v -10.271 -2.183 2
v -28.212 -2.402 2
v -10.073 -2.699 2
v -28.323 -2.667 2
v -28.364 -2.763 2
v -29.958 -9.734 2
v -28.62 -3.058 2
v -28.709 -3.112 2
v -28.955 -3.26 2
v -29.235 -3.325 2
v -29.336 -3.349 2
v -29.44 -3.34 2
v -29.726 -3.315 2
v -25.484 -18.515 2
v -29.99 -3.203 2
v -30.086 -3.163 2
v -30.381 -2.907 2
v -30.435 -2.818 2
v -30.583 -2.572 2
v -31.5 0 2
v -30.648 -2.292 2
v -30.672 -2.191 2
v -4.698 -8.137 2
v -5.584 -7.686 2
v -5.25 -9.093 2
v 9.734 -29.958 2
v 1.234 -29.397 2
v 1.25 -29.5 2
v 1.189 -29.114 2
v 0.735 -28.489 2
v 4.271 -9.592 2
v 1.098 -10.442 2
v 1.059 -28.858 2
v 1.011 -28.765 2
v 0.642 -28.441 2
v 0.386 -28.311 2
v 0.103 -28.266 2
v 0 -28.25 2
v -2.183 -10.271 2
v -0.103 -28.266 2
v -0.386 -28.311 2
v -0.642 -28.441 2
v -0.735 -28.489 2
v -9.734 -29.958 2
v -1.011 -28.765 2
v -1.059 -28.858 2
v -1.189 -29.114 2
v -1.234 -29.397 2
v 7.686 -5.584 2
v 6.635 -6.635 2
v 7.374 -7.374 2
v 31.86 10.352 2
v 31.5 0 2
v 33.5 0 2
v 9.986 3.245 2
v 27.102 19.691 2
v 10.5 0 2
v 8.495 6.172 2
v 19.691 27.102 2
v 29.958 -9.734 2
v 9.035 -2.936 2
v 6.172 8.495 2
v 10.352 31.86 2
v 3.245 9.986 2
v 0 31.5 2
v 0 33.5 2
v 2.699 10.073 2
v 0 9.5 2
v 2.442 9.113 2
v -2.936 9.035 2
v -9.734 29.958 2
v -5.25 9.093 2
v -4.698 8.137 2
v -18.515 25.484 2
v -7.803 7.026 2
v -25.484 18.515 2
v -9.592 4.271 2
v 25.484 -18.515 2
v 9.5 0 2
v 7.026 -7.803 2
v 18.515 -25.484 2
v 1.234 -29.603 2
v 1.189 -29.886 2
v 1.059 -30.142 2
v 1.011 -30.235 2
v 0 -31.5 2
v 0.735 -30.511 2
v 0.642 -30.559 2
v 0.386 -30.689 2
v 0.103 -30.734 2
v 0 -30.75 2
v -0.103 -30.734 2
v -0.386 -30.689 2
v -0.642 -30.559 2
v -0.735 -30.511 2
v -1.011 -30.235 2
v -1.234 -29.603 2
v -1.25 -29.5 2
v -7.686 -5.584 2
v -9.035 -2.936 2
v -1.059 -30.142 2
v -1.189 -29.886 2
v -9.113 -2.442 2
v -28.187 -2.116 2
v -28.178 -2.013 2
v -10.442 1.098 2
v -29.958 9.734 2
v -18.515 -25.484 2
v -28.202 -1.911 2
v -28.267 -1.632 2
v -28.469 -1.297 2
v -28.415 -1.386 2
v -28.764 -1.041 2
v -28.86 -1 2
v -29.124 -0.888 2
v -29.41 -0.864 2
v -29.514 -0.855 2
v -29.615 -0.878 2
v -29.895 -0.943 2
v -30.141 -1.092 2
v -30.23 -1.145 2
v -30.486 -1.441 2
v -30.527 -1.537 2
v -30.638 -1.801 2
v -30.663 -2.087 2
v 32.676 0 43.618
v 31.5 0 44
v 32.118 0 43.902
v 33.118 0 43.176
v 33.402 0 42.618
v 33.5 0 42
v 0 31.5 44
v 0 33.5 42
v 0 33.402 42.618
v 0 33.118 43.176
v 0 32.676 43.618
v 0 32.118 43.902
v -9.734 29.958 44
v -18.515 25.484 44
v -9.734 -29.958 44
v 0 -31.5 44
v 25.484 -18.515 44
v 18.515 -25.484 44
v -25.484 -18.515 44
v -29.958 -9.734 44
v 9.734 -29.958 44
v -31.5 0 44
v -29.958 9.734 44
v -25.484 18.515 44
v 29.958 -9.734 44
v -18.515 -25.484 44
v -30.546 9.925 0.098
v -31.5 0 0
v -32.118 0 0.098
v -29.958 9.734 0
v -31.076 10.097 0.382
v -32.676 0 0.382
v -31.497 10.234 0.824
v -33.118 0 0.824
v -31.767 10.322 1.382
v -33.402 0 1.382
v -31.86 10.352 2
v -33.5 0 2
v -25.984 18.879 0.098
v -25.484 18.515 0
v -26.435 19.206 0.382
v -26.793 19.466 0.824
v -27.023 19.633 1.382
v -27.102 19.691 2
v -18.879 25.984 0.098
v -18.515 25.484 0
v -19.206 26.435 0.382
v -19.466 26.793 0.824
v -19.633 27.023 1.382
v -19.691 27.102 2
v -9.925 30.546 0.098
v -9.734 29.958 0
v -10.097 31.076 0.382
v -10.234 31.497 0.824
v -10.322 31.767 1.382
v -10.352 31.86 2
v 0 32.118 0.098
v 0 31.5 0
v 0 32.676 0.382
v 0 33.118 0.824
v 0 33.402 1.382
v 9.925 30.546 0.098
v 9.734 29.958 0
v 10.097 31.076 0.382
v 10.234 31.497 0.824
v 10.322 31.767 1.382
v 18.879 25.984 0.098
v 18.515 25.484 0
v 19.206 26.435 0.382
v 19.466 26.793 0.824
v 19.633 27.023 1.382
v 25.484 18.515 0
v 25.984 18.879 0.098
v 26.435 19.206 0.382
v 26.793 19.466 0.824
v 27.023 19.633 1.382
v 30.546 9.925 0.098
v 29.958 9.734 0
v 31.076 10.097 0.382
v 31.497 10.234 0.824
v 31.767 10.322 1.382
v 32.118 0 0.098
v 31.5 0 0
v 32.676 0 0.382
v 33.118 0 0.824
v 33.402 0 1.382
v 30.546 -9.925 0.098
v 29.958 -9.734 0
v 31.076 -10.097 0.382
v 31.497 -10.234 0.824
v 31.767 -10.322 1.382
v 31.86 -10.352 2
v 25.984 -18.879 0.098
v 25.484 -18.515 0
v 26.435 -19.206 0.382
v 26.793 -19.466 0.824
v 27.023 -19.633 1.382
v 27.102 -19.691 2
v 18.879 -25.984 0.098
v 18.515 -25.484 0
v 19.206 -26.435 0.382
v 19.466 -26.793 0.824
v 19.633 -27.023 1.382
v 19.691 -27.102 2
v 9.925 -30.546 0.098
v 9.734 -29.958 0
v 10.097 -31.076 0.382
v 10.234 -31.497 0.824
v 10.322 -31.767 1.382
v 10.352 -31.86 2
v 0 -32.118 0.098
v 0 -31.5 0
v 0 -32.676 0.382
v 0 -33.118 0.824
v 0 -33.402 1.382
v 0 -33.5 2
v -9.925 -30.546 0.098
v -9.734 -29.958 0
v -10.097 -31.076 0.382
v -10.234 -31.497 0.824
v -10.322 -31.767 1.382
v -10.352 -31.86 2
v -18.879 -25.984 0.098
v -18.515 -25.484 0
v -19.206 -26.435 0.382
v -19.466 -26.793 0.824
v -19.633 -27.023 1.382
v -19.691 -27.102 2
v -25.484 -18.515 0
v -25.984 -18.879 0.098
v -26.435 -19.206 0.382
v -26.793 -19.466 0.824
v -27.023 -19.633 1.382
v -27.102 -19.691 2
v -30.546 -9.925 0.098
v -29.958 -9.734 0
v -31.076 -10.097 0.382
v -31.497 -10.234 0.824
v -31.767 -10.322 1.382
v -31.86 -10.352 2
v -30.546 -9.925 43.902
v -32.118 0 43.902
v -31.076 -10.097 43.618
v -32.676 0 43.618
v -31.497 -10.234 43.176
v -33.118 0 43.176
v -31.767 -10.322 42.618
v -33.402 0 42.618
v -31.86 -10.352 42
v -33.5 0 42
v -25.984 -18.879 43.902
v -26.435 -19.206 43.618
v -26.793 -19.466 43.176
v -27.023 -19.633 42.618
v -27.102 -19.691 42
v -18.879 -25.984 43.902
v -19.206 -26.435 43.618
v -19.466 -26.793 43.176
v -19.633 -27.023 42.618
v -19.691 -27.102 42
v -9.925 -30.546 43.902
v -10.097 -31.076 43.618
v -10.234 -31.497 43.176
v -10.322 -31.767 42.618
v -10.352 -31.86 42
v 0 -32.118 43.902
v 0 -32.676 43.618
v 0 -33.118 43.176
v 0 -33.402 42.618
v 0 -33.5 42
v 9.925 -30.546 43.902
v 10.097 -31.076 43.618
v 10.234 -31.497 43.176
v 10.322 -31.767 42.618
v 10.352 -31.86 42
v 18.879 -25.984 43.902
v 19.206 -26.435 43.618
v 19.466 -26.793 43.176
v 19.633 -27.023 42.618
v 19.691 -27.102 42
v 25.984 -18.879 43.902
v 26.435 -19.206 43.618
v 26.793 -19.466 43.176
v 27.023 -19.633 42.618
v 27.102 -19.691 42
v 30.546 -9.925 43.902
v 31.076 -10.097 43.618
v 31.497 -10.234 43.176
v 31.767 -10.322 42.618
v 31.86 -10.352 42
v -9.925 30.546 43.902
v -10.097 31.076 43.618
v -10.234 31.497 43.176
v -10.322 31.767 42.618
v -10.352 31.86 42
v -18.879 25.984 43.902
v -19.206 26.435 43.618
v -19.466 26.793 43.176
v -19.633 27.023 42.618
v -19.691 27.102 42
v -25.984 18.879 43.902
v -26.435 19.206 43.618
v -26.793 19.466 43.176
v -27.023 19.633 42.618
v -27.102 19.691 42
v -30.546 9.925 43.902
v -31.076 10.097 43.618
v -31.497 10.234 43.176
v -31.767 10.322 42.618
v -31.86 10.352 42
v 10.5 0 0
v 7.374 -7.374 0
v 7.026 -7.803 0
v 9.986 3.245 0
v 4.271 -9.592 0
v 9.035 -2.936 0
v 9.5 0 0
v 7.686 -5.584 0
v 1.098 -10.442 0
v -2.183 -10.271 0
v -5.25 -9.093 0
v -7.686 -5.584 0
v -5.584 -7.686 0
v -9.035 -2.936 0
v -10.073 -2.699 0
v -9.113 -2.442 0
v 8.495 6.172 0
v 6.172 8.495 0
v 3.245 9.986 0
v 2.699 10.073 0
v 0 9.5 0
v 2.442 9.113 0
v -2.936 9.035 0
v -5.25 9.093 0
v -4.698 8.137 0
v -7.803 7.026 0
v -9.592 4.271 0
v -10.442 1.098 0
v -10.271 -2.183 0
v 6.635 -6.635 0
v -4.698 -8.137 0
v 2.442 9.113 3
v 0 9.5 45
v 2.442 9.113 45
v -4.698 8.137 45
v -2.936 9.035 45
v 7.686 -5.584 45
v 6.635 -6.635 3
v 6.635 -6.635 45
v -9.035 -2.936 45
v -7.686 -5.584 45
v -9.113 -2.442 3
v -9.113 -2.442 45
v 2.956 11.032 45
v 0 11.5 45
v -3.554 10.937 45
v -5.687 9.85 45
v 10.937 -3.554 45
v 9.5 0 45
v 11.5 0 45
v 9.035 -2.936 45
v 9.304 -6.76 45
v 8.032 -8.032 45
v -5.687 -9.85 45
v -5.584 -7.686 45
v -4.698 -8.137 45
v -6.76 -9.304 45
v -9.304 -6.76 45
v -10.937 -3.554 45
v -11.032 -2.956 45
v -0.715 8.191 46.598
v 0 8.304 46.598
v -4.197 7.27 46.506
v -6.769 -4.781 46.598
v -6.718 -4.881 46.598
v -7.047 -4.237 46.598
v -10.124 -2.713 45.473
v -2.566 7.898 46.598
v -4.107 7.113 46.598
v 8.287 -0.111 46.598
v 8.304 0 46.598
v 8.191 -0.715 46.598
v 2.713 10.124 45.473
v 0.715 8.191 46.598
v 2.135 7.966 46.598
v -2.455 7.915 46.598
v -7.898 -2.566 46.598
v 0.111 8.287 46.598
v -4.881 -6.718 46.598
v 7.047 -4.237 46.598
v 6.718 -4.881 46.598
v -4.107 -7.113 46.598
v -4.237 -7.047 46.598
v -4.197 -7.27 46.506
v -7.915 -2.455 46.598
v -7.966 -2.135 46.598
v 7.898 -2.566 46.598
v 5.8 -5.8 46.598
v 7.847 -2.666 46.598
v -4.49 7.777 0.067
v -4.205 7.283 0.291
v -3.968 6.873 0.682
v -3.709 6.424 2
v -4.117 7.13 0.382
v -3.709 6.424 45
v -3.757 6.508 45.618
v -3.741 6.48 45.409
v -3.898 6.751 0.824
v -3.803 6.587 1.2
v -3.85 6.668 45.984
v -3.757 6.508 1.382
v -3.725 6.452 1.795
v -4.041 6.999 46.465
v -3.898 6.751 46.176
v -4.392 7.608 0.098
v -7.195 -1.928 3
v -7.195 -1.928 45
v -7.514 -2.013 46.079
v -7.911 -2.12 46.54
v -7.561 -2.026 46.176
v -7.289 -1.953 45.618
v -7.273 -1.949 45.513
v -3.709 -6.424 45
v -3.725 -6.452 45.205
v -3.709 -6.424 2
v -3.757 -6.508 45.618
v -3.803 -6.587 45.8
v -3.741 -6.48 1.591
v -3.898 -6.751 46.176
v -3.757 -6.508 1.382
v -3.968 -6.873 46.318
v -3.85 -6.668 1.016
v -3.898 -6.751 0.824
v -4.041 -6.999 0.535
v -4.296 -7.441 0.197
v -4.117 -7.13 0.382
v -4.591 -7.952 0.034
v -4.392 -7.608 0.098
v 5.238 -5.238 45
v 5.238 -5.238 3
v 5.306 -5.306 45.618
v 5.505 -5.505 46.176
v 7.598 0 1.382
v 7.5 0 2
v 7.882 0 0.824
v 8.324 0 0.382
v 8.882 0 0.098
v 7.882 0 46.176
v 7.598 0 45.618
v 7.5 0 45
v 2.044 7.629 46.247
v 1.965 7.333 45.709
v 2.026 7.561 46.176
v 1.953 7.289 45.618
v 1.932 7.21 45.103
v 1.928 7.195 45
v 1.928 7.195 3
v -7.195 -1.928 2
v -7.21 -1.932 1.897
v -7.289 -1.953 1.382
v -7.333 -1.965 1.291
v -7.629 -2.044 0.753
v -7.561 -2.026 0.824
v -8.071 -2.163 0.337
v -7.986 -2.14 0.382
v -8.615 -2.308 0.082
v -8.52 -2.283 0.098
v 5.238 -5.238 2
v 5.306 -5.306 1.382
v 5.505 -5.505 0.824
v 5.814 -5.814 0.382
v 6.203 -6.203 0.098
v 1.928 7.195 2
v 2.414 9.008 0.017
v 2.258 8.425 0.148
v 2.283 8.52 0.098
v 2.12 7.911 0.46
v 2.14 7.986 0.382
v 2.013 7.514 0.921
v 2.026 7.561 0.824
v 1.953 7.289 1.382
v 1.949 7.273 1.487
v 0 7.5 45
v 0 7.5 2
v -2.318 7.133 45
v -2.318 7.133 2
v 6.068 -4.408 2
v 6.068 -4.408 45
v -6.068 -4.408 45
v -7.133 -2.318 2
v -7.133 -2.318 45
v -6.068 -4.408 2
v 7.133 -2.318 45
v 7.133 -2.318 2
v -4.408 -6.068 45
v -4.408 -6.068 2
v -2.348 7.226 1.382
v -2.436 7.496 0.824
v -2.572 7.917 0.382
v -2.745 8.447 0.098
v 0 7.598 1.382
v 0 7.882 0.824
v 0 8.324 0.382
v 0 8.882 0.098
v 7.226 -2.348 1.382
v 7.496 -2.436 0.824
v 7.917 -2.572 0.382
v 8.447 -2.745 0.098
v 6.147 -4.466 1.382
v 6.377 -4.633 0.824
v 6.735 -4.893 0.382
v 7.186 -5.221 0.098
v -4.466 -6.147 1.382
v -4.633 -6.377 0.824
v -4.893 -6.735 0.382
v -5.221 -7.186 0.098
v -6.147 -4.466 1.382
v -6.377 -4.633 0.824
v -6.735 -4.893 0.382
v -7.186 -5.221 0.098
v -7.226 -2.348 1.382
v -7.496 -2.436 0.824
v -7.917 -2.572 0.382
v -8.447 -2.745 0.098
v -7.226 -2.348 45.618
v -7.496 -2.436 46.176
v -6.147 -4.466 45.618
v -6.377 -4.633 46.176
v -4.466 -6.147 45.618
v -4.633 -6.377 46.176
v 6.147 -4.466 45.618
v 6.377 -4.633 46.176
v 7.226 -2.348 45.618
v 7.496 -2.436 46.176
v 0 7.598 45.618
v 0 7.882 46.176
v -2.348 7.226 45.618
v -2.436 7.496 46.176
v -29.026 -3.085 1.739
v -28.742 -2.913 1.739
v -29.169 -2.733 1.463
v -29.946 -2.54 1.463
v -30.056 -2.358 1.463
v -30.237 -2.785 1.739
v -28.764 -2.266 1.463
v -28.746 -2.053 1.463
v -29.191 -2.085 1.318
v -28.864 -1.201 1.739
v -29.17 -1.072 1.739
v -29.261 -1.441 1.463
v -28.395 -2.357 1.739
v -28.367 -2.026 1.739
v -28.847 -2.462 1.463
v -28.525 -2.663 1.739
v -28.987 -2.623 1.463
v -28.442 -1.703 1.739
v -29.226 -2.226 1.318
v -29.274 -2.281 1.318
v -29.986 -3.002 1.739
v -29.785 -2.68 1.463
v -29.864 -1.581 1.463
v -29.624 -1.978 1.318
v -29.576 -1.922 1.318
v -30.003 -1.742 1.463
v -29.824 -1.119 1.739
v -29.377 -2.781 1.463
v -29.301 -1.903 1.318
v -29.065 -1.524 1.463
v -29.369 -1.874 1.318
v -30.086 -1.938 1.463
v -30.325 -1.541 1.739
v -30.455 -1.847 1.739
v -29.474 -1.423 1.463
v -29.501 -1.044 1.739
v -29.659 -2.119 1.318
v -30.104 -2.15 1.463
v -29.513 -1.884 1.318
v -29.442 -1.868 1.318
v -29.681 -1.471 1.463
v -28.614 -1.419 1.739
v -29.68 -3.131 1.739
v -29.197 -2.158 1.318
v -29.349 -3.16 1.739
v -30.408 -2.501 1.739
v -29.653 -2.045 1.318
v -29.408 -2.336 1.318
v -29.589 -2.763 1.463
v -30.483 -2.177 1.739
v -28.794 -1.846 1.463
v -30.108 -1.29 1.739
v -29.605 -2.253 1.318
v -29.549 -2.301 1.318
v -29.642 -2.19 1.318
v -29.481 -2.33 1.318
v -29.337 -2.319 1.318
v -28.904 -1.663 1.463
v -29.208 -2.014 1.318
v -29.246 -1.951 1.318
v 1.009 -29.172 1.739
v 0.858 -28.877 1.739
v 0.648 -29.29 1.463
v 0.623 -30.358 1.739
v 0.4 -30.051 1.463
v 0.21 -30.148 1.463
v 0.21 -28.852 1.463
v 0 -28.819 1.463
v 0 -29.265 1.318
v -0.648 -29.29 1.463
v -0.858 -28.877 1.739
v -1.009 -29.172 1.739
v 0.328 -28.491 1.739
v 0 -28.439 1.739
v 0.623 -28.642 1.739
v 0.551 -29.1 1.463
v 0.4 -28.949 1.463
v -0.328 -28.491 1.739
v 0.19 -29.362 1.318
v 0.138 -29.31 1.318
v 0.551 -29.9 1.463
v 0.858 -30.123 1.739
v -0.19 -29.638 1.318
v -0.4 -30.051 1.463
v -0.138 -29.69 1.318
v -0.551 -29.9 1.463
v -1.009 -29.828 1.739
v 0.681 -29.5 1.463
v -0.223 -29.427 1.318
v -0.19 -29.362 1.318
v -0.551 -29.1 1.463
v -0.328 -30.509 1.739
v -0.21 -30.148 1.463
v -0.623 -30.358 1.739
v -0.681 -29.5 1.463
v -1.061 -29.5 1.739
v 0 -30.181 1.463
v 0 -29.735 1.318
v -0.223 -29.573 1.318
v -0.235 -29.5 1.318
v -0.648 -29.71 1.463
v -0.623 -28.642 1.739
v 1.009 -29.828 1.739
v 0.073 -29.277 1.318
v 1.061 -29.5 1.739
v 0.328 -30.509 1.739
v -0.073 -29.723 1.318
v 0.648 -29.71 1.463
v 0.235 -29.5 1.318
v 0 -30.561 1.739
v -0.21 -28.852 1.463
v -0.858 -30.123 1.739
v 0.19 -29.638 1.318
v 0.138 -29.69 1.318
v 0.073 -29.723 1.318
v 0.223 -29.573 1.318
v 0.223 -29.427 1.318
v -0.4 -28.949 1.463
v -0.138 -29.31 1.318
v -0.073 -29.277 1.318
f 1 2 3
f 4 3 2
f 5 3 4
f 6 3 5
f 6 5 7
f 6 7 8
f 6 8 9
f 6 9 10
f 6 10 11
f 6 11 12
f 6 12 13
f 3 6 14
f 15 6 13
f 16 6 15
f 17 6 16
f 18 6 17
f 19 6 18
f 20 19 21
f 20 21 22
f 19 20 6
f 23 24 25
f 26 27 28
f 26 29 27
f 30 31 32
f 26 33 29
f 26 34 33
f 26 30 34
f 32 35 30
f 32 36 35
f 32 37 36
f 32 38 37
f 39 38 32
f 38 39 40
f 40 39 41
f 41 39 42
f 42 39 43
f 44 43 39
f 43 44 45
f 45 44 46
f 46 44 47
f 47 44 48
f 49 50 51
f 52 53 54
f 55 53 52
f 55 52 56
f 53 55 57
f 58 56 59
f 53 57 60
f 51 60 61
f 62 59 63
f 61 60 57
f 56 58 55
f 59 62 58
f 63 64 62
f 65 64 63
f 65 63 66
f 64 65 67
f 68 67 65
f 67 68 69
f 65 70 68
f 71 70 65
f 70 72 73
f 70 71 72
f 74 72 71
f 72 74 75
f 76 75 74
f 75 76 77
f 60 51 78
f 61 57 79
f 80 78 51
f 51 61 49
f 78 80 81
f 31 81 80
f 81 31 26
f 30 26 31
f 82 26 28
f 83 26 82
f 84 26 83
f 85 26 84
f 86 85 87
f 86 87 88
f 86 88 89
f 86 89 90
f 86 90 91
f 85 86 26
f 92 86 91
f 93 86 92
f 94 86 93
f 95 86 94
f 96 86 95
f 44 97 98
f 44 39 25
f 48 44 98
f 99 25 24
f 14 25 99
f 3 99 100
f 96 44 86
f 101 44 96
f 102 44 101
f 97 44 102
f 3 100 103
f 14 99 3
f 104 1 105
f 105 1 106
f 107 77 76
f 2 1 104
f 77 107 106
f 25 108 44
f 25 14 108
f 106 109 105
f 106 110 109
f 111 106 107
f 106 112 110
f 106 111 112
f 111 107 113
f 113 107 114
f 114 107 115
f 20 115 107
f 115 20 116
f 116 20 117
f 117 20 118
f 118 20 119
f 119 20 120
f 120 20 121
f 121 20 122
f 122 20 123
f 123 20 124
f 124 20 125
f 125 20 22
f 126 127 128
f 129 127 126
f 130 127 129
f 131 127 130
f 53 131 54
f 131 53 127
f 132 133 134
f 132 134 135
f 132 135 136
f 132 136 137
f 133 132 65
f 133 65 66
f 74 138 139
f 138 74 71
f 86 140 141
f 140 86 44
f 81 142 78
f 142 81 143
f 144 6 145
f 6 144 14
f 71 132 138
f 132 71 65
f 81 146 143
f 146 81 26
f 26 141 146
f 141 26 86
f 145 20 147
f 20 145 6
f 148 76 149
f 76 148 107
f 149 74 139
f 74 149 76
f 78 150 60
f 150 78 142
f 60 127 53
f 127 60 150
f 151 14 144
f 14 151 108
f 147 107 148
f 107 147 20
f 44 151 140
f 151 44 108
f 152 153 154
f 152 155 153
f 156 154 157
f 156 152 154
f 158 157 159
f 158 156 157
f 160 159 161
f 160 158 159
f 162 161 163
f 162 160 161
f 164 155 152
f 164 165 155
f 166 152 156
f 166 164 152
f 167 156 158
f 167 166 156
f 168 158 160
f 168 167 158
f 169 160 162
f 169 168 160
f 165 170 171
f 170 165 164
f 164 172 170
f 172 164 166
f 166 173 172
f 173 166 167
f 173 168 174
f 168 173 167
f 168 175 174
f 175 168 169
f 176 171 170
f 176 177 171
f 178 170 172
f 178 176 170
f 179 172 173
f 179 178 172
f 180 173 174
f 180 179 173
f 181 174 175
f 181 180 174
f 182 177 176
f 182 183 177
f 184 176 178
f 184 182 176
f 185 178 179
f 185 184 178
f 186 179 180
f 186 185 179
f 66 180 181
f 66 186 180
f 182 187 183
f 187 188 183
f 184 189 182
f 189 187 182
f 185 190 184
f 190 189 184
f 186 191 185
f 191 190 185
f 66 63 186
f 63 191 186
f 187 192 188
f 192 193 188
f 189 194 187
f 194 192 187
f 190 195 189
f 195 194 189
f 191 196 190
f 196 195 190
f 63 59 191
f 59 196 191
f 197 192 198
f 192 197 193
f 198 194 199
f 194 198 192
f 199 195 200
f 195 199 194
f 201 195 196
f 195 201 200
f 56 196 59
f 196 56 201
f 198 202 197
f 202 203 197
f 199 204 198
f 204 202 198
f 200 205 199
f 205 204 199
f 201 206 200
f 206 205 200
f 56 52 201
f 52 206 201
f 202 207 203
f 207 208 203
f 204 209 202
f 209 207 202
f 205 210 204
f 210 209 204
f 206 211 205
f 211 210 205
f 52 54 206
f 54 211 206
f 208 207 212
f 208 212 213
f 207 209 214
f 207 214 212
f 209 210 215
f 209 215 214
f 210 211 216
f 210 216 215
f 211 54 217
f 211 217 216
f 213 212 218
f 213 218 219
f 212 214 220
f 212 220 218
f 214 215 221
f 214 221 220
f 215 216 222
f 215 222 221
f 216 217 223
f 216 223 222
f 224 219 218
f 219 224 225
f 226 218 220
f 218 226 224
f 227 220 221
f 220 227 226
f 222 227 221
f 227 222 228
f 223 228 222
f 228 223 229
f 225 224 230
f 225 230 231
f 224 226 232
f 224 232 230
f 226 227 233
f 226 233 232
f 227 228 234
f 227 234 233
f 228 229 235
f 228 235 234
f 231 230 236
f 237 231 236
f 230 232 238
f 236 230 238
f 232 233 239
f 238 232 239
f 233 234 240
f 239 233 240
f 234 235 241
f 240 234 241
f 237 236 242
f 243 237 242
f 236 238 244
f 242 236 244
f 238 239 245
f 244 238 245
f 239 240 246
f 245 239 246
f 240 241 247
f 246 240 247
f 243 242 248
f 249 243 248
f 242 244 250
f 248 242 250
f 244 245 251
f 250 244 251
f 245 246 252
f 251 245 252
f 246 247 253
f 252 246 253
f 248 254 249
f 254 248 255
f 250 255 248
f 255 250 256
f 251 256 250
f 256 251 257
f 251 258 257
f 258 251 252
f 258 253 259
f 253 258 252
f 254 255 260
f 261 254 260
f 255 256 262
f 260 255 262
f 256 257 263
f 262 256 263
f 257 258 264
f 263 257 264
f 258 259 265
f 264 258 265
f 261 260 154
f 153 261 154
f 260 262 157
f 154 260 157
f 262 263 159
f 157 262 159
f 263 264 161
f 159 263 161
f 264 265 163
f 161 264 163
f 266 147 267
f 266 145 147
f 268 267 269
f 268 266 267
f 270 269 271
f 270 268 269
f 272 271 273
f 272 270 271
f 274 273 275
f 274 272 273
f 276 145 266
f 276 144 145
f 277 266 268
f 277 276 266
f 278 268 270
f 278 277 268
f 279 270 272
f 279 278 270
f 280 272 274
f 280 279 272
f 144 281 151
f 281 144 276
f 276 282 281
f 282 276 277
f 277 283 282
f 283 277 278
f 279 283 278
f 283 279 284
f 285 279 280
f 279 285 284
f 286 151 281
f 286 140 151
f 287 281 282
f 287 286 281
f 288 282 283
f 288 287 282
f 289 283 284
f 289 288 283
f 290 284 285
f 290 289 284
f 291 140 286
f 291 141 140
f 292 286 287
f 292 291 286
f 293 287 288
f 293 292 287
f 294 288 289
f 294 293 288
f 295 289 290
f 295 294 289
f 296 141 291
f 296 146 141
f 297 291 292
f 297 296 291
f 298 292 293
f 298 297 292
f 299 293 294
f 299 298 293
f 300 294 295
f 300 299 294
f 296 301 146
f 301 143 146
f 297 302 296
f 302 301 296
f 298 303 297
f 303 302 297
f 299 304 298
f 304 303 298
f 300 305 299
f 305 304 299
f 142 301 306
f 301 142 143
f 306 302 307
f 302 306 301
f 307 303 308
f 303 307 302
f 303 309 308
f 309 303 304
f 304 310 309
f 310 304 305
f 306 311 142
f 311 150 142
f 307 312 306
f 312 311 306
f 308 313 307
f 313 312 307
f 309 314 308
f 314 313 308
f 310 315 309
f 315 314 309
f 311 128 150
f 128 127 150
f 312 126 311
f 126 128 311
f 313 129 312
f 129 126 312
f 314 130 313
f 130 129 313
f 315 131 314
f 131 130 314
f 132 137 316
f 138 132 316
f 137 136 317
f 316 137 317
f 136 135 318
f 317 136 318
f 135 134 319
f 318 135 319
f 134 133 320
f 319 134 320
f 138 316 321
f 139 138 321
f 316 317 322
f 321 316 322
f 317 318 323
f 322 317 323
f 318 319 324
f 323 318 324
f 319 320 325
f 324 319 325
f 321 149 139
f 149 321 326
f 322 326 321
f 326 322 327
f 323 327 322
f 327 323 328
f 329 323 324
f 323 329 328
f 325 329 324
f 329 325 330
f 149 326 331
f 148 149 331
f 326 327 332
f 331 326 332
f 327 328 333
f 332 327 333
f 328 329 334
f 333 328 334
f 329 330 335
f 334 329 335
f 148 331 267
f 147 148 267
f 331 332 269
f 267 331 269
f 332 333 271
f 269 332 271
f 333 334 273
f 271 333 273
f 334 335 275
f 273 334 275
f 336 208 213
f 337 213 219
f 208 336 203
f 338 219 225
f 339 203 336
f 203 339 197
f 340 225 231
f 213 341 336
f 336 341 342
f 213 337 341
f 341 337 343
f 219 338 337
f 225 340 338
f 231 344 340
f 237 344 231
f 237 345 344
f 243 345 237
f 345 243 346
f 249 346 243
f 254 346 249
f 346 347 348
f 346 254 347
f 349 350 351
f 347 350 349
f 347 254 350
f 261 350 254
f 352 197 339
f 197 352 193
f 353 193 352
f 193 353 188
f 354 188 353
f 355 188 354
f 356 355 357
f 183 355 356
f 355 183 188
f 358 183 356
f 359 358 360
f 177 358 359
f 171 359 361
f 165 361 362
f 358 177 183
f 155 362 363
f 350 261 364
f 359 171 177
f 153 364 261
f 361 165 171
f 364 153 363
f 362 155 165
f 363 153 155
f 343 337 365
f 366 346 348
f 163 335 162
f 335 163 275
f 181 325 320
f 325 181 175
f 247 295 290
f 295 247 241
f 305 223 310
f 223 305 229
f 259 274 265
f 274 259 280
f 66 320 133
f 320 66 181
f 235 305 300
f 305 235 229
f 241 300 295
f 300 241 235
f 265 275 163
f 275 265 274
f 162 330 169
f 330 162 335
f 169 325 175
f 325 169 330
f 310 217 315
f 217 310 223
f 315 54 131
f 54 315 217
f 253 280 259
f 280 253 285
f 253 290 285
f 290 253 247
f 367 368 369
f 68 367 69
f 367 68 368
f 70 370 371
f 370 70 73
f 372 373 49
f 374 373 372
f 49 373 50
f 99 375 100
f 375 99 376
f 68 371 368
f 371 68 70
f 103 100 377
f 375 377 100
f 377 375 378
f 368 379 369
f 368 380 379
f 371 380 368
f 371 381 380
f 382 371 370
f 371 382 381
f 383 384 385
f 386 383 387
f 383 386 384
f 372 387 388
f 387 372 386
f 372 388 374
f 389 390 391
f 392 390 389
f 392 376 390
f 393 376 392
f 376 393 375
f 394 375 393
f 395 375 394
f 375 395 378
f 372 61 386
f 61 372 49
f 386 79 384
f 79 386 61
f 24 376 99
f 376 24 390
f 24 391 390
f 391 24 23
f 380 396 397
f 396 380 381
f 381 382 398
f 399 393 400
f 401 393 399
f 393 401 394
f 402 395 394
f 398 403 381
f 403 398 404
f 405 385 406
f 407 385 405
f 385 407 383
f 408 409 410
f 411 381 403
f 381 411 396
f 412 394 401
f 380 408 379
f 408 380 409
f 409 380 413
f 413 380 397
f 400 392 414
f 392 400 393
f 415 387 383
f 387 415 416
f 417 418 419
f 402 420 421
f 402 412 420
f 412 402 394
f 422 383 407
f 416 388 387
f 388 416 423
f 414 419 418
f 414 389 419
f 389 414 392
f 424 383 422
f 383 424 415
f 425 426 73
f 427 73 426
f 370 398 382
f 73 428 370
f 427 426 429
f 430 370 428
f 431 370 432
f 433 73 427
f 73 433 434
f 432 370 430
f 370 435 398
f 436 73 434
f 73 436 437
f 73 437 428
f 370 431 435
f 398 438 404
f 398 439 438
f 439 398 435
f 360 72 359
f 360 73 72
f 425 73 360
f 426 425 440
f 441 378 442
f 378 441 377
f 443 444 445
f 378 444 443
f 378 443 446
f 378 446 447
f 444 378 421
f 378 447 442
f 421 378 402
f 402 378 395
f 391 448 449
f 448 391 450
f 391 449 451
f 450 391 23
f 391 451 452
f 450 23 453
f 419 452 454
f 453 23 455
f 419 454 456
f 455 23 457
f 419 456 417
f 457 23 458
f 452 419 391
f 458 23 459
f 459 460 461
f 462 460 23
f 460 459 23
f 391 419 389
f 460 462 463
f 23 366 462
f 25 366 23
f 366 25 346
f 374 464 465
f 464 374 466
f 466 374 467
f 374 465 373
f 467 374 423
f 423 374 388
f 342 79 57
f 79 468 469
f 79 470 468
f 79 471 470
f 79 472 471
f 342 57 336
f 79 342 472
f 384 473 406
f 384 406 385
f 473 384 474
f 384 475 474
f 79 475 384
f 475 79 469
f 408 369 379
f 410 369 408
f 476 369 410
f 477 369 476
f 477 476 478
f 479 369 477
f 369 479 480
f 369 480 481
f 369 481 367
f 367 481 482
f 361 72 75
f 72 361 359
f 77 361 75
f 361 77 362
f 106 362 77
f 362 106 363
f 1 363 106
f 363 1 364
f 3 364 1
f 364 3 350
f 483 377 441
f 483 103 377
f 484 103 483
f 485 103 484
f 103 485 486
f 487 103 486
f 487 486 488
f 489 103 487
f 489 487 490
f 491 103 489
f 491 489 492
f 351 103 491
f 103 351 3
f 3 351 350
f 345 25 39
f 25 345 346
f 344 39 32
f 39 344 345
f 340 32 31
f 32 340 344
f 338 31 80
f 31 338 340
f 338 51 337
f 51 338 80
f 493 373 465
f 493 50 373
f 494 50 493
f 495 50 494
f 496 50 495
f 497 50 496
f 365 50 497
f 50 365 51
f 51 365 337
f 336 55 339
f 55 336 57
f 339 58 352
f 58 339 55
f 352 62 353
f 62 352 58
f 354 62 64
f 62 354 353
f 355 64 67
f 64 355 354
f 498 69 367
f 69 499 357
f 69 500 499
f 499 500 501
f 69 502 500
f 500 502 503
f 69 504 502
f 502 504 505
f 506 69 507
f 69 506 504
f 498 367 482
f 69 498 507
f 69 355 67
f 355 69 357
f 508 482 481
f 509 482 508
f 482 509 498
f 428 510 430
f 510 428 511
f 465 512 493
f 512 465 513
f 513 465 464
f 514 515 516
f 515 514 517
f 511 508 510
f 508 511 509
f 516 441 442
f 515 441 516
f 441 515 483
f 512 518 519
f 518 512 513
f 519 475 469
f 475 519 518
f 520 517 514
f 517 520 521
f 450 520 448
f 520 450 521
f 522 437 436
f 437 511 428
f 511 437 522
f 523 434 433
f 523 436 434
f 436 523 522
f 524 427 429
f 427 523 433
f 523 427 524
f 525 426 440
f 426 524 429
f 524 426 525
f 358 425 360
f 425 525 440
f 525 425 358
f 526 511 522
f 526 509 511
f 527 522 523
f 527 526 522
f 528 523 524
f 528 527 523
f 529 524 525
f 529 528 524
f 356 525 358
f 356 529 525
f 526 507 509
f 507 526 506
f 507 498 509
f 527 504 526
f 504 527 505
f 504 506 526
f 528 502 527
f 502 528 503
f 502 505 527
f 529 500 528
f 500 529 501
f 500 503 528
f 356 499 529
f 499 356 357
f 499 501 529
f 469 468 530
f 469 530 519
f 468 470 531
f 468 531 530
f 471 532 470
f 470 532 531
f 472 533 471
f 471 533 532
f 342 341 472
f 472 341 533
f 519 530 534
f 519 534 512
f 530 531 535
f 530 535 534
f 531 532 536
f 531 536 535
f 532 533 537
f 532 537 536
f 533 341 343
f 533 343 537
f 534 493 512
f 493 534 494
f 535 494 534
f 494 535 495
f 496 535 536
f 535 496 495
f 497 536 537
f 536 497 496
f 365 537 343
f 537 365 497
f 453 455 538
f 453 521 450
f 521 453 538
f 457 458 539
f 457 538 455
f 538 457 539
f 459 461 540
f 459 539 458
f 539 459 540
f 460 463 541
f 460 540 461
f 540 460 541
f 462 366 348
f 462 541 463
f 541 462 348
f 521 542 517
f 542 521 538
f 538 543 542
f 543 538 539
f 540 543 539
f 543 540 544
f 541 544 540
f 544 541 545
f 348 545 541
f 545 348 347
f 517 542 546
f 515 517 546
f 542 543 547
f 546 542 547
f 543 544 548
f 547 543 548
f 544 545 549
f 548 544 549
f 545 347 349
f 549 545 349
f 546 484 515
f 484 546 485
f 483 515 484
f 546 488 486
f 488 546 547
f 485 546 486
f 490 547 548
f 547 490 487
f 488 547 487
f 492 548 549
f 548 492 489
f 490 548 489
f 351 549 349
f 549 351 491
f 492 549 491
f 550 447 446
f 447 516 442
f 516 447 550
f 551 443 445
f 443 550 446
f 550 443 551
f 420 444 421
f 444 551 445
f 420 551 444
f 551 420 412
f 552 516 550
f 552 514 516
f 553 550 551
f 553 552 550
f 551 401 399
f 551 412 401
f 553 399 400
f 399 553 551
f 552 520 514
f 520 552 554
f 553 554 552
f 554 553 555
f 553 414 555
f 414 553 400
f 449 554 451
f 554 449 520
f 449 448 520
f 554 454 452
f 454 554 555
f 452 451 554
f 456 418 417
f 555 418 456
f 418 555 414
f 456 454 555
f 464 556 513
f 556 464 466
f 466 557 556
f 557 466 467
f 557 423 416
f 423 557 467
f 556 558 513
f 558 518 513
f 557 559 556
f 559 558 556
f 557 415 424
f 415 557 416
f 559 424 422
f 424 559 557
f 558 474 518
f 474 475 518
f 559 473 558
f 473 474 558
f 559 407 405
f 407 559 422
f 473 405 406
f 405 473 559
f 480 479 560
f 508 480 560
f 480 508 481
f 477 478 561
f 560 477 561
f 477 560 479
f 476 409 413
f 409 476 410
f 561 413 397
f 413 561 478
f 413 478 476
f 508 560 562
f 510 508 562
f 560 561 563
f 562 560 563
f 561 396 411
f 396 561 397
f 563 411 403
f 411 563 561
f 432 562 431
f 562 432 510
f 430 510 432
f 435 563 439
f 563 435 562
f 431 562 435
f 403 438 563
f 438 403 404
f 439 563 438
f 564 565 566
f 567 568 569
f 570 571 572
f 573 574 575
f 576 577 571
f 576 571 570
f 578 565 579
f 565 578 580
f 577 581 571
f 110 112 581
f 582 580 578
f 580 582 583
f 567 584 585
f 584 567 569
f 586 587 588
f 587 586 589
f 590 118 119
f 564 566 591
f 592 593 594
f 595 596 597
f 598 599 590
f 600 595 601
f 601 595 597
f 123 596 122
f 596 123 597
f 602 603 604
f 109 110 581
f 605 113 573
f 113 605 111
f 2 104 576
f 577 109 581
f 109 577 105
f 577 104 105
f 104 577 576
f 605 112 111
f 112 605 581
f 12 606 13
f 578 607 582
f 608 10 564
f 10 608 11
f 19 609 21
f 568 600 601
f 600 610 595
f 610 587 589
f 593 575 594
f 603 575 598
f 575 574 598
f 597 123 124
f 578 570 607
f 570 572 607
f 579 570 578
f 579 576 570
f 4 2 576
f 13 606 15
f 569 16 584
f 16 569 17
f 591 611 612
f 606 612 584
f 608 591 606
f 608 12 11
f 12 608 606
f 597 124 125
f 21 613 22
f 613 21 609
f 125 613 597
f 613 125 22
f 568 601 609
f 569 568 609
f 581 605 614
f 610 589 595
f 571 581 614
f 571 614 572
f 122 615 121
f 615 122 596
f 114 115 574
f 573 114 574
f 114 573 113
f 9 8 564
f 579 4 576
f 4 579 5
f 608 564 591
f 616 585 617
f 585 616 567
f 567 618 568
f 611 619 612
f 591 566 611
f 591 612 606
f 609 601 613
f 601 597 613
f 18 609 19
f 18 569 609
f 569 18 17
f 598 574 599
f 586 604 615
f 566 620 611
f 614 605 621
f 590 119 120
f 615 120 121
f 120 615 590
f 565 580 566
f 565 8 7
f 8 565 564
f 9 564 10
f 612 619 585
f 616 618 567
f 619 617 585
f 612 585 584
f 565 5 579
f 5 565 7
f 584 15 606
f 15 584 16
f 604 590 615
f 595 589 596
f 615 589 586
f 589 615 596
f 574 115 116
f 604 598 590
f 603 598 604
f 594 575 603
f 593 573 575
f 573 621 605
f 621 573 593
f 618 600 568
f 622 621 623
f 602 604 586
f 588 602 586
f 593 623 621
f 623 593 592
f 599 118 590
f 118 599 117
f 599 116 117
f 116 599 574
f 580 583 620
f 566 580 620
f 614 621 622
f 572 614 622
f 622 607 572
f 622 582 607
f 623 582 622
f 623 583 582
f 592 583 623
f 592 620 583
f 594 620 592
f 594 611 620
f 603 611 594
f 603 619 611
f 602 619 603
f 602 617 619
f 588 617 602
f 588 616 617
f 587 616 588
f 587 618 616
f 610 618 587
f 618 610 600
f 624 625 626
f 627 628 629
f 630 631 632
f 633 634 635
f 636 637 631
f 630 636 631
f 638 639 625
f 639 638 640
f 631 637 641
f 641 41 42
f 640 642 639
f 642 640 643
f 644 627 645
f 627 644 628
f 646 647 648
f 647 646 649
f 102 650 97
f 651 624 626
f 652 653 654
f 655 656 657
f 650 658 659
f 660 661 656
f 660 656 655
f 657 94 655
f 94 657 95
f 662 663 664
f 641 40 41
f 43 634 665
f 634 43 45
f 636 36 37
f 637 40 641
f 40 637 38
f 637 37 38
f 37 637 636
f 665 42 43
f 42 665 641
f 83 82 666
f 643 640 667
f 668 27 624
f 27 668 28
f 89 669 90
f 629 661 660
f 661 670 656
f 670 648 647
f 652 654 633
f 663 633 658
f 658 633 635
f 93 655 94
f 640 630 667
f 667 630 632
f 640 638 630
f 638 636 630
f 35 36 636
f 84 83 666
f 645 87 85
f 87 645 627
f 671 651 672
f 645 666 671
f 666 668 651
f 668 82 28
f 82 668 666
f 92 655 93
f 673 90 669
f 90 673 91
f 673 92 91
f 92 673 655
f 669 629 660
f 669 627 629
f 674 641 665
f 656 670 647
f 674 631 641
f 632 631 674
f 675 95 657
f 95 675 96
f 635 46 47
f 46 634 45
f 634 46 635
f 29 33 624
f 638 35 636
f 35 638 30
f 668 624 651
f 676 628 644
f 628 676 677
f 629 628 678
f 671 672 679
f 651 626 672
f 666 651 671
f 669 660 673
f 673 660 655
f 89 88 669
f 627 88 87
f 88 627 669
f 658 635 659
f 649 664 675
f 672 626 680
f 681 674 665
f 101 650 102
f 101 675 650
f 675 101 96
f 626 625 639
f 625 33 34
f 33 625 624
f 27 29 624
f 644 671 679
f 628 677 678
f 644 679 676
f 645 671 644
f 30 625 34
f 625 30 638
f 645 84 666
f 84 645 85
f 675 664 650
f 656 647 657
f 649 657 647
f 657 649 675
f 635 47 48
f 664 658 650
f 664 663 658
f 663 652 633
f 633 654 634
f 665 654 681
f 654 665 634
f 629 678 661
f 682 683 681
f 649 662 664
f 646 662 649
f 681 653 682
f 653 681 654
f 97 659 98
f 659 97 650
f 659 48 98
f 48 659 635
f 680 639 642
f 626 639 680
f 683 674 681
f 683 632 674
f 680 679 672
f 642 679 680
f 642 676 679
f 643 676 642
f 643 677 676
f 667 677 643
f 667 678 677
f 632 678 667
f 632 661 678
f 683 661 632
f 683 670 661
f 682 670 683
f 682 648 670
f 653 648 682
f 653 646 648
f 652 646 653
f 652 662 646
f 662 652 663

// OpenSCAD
use <tapeholder.scad>;

height = 40;
outer_radius = 57/2;
inner_radius = 25/2;

outlet_angle = 90;

tape_base = 3;
tape_thickness = 0.25;

connector_snap_number = 3;
connector_snap_size = 1;
connector_snap_angle = 45;

closing_snap_height = 1.2;

thickness = 2;

offset = 1;

resolution = 200;

$fn = resolution;

//inner_part(height, outer_radius, inner_radius, outlet_angle, tape_base, thickness, offset);

outer_part(height, outer_radius, inner_radius, tape_thickness, connector_snap_angle, connector_snap_size, connector_snap_number, thickness, offset);
